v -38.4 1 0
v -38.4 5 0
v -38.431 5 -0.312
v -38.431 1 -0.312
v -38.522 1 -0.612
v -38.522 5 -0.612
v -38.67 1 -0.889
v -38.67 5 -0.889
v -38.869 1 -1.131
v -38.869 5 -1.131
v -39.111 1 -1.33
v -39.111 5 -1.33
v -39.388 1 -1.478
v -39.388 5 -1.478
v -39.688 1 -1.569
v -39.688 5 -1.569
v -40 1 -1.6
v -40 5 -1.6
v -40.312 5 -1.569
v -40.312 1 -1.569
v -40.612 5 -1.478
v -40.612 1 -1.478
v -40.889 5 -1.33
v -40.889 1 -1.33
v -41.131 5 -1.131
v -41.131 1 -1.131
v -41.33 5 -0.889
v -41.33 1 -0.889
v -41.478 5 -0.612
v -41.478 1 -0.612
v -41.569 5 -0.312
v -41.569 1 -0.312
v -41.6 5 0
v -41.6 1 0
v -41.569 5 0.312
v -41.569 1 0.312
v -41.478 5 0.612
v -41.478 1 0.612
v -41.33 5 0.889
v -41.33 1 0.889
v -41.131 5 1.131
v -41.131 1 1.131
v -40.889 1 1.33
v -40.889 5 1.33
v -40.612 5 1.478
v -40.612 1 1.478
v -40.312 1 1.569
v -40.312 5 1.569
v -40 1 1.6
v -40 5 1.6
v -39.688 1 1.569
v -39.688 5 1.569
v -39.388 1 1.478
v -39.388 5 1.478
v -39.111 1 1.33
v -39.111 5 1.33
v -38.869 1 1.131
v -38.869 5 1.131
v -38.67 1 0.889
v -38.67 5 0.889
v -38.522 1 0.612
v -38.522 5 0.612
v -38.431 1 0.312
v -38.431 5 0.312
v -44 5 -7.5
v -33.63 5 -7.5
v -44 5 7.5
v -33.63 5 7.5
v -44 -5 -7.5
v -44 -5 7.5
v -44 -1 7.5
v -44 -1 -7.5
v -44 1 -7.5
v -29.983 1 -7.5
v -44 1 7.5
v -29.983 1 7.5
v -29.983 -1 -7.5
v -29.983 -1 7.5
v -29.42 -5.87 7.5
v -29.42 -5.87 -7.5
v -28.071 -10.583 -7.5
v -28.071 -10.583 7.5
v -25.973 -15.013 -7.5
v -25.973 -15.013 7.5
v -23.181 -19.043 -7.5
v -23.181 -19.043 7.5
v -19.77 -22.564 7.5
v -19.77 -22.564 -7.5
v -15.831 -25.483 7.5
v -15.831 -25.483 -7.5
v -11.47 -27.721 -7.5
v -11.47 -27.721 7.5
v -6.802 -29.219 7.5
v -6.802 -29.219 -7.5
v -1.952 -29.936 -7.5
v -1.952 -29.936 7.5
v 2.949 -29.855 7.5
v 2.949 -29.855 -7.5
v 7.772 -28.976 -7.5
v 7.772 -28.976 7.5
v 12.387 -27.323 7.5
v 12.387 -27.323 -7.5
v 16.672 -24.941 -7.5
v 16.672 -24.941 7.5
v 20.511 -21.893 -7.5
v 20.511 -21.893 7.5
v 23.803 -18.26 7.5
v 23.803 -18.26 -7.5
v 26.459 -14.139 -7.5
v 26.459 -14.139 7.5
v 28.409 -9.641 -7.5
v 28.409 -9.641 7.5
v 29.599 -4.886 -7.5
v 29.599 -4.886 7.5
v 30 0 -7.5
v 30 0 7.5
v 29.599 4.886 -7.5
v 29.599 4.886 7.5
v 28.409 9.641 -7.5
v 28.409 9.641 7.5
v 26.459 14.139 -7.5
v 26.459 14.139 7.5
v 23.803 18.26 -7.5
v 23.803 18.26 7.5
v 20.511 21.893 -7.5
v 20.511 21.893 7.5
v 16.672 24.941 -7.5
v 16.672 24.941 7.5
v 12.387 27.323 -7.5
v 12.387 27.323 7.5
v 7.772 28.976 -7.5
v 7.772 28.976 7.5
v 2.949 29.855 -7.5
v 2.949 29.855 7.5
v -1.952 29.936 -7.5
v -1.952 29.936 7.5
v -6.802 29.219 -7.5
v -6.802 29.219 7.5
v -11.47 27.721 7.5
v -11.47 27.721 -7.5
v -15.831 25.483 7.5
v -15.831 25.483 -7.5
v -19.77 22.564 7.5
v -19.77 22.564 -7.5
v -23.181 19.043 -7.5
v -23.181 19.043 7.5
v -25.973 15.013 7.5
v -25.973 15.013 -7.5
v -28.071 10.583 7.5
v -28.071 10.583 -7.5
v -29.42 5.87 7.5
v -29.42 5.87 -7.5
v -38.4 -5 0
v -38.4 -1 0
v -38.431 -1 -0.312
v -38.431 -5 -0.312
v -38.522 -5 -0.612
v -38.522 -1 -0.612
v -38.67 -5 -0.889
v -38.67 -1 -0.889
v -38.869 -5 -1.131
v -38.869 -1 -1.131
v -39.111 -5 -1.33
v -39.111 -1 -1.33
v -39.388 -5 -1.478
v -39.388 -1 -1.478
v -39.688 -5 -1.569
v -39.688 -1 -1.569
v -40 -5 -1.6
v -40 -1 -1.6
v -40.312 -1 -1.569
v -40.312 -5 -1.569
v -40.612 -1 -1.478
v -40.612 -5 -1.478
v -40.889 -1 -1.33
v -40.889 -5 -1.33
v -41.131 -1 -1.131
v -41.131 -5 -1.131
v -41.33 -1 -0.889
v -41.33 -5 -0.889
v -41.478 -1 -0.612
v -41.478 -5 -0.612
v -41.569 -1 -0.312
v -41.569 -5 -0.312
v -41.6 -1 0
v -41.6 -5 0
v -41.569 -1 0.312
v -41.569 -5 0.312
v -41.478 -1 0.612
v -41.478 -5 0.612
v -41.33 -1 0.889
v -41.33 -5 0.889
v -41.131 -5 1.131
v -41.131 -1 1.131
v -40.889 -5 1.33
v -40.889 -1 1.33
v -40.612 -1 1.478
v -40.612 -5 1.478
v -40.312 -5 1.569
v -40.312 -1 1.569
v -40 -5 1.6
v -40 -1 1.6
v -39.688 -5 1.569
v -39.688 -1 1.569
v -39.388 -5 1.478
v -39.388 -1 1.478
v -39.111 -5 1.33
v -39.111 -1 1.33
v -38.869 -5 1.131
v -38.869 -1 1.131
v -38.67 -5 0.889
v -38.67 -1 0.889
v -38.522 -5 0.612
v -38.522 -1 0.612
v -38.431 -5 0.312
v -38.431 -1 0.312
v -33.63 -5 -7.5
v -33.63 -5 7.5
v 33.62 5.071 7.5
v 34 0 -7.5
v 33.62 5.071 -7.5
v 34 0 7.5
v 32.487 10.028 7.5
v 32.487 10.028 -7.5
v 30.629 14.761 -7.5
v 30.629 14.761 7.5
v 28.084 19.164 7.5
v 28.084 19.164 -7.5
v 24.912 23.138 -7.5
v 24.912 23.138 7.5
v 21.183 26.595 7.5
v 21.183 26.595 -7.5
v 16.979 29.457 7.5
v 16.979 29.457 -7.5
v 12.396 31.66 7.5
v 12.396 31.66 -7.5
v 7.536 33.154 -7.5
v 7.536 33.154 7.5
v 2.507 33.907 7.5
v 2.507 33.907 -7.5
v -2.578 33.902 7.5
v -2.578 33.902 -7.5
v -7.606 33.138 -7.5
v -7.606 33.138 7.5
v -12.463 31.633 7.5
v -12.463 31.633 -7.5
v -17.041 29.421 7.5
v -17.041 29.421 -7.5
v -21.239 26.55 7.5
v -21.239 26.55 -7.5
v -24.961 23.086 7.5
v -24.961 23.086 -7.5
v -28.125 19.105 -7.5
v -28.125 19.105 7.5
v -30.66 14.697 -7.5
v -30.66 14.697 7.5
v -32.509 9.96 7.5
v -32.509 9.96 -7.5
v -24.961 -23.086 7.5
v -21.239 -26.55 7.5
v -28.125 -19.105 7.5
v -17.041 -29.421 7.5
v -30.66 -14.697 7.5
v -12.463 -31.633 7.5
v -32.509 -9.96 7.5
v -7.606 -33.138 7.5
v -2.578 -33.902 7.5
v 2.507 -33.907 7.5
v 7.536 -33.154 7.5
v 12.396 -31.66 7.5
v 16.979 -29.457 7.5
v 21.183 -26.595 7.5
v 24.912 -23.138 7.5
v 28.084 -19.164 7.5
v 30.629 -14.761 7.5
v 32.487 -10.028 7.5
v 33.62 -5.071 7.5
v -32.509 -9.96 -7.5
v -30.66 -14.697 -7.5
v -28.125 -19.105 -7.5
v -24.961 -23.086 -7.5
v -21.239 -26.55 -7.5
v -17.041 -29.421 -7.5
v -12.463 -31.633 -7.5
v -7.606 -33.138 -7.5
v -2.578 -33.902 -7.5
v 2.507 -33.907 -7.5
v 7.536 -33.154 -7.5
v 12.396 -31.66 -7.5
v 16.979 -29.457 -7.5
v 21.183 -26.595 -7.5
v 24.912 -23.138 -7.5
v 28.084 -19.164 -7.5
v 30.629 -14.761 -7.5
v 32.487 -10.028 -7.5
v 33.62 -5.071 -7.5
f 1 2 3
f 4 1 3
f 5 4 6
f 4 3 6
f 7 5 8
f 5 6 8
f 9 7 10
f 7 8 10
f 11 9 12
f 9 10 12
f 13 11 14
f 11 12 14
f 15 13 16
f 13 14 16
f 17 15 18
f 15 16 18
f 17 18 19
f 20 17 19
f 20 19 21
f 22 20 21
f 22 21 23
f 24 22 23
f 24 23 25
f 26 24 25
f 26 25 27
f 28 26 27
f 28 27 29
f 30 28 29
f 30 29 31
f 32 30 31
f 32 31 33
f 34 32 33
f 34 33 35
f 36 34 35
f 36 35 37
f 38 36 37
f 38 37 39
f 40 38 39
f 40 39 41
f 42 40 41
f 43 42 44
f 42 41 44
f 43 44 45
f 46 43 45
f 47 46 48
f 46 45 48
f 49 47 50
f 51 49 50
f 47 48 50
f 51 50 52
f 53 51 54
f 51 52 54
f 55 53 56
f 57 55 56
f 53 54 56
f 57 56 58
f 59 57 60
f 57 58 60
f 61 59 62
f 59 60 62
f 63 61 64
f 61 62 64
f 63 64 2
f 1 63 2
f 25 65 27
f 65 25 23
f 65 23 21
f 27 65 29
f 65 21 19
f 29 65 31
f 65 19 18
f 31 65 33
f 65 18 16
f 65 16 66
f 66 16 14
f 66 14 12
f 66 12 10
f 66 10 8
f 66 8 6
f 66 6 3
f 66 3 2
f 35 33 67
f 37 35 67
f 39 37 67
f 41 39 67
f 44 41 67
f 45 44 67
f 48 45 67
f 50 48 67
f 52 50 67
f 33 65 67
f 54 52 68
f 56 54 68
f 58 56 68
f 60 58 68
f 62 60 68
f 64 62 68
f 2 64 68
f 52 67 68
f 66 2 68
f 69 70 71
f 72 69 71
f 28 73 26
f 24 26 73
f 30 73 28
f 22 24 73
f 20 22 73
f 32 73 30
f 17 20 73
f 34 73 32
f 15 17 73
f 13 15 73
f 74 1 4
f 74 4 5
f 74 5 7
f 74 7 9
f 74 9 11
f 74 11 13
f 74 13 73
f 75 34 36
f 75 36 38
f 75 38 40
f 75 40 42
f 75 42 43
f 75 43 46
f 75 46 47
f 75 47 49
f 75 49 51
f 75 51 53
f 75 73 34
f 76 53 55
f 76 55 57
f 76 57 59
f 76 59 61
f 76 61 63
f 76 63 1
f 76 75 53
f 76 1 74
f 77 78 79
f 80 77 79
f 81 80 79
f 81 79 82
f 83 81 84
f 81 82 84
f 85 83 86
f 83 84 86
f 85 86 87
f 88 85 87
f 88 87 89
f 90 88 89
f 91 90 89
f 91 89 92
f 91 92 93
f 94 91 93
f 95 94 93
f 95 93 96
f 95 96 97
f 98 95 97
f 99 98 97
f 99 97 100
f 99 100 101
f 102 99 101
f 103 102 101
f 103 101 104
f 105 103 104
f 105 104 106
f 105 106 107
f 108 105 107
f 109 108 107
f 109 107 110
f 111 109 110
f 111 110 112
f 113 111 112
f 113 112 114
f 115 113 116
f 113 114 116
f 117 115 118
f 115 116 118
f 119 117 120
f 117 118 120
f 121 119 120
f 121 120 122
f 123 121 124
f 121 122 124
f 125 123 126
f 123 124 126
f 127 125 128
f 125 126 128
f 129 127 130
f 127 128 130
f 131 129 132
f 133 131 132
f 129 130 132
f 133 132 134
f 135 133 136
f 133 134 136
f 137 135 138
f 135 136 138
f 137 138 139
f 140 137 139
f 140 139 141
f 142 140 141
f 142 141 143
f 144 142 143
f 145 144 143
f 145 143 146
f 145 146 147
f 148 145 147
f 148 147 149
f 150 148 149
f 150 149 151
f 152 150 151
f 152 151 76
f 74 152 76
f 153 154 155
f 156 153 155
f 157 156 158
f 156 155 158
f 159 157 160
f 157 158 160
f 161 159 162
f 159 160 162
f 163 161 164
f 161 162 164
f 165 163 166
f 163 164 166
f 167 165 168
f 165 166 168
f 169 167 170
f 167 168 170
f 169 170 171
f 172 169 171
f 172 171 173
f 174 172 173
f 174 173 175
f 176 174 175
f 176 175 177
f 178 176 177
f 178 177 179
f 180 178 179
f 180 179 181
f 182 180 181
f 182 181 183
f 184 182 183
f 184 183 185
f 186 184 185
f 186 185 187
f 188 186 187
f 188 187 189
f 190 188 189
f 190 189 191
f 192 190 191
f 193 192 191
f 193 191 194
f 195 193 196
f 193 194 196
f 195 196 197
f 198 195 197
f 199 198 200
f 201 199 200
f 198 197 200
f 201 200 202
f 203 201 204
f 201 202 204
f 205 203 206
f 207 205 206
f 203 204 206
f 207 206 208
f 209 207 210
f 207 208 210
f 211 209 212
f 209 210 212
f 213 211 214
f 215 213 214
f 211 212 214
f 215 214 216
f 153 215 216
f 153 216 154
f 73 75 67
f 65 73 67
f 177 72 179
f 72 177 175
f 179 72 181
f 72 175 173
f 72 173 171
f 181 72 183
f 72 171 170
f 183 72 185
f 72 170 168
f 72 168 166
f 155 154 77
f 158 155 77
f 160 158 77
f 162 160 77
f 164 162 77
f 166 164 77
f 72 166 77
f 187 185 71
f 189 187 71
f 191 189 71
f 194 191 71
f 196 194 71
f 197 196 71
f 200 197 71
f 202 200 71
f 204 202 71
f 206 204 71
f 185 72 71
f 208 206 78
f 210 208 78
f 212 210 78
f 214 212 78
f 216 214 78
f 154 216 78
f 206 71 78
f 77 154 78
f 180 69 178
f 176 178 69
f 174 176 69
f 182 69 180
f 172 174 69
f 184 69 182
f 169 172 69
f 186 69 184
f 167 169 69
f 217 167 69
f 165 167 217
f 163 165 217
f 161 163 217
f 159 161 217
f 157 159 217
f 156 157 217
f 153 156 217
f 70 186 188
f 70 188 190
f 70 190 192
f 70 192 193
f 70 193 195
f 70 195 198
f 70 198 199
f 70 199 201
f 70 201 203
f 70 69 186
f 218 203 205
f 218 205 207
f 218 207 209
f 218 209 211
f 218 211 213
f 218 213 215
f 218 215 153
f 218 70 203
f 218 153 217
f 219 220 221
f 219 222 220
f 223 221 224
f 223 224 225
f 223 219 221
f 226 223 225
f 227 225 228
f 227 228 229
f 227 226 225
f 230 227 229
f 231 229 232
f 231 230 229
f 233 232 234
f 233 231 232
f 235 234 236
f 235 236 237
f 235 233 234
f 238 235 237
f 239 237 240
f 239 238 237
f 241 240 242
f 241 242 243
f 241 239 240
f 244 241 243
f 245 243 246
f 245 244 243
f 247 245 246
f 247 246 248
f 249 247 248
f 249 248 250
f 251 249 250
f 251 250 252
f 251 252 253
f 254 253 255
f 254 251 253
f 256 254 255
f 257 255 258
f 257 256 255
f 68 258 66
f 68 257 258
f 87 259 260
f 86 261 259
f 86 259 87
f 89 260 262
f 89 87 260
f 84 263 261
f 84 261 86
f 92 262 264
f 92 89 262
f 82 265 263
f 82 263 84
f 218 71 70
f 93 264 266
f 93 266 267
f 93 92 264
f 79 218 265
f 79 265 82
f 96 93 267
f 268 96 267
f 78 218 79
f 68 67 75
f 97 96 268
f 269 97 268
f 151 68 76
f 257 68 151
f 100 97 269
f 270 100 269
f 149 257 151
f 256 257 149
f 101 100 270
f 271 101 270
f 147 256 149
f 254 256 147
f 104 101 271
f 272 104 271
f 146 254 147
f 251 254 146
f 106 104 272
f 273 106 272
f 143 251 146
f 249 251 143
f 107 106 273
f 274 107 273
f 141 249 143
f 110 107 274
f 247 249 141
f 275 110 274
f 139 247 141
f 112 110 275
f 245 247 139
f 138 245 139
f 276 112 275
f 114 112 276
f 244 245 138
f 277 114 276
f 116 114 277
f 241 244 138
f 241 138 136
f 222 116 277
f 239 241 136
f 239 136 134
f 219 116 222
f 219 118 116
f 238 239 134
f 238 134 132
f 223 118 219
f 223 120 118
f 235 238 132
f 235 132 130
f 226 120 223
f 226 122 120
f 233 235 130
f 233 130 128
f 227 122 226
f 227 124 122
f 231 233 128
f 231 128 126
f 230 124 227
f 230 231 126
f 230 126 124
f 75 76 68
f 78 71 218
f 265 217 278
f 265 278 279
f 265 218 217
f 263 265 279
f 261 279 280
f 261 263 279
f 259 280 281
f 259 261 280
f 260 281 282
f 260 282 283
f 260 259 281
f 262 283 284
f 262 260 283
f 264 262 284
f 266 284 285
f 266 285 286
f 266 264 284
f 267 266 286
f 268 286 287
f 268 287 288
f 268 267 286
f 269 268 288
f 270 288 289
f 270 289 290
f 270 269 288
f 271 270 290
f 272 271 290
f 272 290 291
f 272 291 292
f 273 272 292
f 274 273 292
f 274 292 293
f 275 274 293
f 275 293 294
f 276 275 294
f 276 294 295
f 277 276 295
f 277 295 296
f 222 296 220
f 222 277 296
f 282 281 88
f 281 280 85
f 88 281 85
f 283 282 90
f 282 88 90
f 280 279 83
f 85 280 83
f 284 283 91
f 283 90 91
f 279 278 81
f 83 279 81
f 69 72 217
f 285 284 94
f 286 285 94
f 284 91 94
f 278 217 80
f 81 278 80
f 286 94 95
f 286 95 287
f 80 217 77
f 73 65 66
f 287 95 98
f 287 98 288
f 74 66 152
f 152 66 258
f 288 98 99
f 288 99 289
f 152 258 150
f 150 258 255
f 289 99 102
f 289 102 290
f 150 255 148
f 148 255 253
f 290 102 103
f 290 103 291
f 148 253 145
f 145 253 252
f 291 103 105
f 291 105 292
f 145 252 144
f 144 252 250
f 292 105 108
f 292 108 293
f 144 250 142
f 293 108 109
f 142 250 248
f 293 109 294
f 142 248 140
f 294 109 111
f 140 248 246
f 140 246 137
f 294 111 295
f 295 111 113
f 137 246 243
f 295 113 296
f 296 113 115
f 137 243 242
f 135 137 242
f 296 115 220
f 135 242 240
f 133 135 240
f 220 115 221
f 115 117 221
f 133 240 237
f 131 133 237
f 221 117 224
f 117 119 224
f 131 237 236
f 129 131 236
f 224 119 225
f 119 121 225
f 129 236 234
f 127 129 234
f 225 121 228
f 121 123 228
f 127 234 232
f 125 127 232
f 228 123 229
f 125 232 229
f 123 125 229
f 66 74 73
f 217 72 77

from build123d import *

# Parameters (mm, degrees)
SKETCH1_R               = 34
BOSS_EXTRUDE1_DEPTH     = 7.5
SKETCH4_W               = 44
SKETCH4_H               = 10
BOSS_EXTRUDE2_DEPTH     = 7.5
SKETCH5_R               = 30
SKETCH5_W               = 44
SKETCH5_H               = 2
CUT_EXTRUDE1_DEPTH      = 26.5
SKETCH6_R               = 1.6
CUT_EXTRUDE2_DEPTH      = 30
CUT_EXTRUDE2_DEPTH_BACK = 10


with BuildPart() as part:
    # Sketch1 → Boss-Extrude1 (new body, symmetric)
    with BuildSketch(Plane.XY):
        Circle(SKETCH1_R)
    extrude(amount=BOSS_EXTRUDE1_DEPTH, both=True)

    # Sketch4 → Boss-Extrude2 (add, symmetric)
    with BuildSketch(Plane.XY):
        with Locations((-22, 0)):
            Rectangle(SKETCH4_W, SKETCH4_H)
    extrude(amount=BOSS_EXTRUDE2_DEPTH, both=True)

    # Sketch5 → Cut-Extrude1 (cut)
    with BuildSketch(Plane.XY.offset(7.5)):
        Circle(SKETCH5_R)
        with Locations((-22, 0)):
            Rectangle(SKETCH5_W, SKETCH5_H)
    extrude(amount=-CUT_EXTRUDE1_DEPTH, mode=Mode.SUBTRACT)

    # Sketch6 → Cut-Extrude2 (cut, two sides)
    with BuildSketch(Plane(origin=(0, 5, 0), x_dir=(1, 0, 0), z_dir=(0, 1, 0))) as cut_extrude2_sk:
        with Locations((-40, 0)):
            Circle(SKETCH6_R)
    extrude(amount=CUT_EXTRUDE2_DEPTH, mode=Mode.SUBTRACT)
    extrude(cut_extrude2_sk.sketch, amount=-CUT_EXTRUDE2_DEPTH_BACK, mode=Mode.SUBTRACT)


solid = part.part
